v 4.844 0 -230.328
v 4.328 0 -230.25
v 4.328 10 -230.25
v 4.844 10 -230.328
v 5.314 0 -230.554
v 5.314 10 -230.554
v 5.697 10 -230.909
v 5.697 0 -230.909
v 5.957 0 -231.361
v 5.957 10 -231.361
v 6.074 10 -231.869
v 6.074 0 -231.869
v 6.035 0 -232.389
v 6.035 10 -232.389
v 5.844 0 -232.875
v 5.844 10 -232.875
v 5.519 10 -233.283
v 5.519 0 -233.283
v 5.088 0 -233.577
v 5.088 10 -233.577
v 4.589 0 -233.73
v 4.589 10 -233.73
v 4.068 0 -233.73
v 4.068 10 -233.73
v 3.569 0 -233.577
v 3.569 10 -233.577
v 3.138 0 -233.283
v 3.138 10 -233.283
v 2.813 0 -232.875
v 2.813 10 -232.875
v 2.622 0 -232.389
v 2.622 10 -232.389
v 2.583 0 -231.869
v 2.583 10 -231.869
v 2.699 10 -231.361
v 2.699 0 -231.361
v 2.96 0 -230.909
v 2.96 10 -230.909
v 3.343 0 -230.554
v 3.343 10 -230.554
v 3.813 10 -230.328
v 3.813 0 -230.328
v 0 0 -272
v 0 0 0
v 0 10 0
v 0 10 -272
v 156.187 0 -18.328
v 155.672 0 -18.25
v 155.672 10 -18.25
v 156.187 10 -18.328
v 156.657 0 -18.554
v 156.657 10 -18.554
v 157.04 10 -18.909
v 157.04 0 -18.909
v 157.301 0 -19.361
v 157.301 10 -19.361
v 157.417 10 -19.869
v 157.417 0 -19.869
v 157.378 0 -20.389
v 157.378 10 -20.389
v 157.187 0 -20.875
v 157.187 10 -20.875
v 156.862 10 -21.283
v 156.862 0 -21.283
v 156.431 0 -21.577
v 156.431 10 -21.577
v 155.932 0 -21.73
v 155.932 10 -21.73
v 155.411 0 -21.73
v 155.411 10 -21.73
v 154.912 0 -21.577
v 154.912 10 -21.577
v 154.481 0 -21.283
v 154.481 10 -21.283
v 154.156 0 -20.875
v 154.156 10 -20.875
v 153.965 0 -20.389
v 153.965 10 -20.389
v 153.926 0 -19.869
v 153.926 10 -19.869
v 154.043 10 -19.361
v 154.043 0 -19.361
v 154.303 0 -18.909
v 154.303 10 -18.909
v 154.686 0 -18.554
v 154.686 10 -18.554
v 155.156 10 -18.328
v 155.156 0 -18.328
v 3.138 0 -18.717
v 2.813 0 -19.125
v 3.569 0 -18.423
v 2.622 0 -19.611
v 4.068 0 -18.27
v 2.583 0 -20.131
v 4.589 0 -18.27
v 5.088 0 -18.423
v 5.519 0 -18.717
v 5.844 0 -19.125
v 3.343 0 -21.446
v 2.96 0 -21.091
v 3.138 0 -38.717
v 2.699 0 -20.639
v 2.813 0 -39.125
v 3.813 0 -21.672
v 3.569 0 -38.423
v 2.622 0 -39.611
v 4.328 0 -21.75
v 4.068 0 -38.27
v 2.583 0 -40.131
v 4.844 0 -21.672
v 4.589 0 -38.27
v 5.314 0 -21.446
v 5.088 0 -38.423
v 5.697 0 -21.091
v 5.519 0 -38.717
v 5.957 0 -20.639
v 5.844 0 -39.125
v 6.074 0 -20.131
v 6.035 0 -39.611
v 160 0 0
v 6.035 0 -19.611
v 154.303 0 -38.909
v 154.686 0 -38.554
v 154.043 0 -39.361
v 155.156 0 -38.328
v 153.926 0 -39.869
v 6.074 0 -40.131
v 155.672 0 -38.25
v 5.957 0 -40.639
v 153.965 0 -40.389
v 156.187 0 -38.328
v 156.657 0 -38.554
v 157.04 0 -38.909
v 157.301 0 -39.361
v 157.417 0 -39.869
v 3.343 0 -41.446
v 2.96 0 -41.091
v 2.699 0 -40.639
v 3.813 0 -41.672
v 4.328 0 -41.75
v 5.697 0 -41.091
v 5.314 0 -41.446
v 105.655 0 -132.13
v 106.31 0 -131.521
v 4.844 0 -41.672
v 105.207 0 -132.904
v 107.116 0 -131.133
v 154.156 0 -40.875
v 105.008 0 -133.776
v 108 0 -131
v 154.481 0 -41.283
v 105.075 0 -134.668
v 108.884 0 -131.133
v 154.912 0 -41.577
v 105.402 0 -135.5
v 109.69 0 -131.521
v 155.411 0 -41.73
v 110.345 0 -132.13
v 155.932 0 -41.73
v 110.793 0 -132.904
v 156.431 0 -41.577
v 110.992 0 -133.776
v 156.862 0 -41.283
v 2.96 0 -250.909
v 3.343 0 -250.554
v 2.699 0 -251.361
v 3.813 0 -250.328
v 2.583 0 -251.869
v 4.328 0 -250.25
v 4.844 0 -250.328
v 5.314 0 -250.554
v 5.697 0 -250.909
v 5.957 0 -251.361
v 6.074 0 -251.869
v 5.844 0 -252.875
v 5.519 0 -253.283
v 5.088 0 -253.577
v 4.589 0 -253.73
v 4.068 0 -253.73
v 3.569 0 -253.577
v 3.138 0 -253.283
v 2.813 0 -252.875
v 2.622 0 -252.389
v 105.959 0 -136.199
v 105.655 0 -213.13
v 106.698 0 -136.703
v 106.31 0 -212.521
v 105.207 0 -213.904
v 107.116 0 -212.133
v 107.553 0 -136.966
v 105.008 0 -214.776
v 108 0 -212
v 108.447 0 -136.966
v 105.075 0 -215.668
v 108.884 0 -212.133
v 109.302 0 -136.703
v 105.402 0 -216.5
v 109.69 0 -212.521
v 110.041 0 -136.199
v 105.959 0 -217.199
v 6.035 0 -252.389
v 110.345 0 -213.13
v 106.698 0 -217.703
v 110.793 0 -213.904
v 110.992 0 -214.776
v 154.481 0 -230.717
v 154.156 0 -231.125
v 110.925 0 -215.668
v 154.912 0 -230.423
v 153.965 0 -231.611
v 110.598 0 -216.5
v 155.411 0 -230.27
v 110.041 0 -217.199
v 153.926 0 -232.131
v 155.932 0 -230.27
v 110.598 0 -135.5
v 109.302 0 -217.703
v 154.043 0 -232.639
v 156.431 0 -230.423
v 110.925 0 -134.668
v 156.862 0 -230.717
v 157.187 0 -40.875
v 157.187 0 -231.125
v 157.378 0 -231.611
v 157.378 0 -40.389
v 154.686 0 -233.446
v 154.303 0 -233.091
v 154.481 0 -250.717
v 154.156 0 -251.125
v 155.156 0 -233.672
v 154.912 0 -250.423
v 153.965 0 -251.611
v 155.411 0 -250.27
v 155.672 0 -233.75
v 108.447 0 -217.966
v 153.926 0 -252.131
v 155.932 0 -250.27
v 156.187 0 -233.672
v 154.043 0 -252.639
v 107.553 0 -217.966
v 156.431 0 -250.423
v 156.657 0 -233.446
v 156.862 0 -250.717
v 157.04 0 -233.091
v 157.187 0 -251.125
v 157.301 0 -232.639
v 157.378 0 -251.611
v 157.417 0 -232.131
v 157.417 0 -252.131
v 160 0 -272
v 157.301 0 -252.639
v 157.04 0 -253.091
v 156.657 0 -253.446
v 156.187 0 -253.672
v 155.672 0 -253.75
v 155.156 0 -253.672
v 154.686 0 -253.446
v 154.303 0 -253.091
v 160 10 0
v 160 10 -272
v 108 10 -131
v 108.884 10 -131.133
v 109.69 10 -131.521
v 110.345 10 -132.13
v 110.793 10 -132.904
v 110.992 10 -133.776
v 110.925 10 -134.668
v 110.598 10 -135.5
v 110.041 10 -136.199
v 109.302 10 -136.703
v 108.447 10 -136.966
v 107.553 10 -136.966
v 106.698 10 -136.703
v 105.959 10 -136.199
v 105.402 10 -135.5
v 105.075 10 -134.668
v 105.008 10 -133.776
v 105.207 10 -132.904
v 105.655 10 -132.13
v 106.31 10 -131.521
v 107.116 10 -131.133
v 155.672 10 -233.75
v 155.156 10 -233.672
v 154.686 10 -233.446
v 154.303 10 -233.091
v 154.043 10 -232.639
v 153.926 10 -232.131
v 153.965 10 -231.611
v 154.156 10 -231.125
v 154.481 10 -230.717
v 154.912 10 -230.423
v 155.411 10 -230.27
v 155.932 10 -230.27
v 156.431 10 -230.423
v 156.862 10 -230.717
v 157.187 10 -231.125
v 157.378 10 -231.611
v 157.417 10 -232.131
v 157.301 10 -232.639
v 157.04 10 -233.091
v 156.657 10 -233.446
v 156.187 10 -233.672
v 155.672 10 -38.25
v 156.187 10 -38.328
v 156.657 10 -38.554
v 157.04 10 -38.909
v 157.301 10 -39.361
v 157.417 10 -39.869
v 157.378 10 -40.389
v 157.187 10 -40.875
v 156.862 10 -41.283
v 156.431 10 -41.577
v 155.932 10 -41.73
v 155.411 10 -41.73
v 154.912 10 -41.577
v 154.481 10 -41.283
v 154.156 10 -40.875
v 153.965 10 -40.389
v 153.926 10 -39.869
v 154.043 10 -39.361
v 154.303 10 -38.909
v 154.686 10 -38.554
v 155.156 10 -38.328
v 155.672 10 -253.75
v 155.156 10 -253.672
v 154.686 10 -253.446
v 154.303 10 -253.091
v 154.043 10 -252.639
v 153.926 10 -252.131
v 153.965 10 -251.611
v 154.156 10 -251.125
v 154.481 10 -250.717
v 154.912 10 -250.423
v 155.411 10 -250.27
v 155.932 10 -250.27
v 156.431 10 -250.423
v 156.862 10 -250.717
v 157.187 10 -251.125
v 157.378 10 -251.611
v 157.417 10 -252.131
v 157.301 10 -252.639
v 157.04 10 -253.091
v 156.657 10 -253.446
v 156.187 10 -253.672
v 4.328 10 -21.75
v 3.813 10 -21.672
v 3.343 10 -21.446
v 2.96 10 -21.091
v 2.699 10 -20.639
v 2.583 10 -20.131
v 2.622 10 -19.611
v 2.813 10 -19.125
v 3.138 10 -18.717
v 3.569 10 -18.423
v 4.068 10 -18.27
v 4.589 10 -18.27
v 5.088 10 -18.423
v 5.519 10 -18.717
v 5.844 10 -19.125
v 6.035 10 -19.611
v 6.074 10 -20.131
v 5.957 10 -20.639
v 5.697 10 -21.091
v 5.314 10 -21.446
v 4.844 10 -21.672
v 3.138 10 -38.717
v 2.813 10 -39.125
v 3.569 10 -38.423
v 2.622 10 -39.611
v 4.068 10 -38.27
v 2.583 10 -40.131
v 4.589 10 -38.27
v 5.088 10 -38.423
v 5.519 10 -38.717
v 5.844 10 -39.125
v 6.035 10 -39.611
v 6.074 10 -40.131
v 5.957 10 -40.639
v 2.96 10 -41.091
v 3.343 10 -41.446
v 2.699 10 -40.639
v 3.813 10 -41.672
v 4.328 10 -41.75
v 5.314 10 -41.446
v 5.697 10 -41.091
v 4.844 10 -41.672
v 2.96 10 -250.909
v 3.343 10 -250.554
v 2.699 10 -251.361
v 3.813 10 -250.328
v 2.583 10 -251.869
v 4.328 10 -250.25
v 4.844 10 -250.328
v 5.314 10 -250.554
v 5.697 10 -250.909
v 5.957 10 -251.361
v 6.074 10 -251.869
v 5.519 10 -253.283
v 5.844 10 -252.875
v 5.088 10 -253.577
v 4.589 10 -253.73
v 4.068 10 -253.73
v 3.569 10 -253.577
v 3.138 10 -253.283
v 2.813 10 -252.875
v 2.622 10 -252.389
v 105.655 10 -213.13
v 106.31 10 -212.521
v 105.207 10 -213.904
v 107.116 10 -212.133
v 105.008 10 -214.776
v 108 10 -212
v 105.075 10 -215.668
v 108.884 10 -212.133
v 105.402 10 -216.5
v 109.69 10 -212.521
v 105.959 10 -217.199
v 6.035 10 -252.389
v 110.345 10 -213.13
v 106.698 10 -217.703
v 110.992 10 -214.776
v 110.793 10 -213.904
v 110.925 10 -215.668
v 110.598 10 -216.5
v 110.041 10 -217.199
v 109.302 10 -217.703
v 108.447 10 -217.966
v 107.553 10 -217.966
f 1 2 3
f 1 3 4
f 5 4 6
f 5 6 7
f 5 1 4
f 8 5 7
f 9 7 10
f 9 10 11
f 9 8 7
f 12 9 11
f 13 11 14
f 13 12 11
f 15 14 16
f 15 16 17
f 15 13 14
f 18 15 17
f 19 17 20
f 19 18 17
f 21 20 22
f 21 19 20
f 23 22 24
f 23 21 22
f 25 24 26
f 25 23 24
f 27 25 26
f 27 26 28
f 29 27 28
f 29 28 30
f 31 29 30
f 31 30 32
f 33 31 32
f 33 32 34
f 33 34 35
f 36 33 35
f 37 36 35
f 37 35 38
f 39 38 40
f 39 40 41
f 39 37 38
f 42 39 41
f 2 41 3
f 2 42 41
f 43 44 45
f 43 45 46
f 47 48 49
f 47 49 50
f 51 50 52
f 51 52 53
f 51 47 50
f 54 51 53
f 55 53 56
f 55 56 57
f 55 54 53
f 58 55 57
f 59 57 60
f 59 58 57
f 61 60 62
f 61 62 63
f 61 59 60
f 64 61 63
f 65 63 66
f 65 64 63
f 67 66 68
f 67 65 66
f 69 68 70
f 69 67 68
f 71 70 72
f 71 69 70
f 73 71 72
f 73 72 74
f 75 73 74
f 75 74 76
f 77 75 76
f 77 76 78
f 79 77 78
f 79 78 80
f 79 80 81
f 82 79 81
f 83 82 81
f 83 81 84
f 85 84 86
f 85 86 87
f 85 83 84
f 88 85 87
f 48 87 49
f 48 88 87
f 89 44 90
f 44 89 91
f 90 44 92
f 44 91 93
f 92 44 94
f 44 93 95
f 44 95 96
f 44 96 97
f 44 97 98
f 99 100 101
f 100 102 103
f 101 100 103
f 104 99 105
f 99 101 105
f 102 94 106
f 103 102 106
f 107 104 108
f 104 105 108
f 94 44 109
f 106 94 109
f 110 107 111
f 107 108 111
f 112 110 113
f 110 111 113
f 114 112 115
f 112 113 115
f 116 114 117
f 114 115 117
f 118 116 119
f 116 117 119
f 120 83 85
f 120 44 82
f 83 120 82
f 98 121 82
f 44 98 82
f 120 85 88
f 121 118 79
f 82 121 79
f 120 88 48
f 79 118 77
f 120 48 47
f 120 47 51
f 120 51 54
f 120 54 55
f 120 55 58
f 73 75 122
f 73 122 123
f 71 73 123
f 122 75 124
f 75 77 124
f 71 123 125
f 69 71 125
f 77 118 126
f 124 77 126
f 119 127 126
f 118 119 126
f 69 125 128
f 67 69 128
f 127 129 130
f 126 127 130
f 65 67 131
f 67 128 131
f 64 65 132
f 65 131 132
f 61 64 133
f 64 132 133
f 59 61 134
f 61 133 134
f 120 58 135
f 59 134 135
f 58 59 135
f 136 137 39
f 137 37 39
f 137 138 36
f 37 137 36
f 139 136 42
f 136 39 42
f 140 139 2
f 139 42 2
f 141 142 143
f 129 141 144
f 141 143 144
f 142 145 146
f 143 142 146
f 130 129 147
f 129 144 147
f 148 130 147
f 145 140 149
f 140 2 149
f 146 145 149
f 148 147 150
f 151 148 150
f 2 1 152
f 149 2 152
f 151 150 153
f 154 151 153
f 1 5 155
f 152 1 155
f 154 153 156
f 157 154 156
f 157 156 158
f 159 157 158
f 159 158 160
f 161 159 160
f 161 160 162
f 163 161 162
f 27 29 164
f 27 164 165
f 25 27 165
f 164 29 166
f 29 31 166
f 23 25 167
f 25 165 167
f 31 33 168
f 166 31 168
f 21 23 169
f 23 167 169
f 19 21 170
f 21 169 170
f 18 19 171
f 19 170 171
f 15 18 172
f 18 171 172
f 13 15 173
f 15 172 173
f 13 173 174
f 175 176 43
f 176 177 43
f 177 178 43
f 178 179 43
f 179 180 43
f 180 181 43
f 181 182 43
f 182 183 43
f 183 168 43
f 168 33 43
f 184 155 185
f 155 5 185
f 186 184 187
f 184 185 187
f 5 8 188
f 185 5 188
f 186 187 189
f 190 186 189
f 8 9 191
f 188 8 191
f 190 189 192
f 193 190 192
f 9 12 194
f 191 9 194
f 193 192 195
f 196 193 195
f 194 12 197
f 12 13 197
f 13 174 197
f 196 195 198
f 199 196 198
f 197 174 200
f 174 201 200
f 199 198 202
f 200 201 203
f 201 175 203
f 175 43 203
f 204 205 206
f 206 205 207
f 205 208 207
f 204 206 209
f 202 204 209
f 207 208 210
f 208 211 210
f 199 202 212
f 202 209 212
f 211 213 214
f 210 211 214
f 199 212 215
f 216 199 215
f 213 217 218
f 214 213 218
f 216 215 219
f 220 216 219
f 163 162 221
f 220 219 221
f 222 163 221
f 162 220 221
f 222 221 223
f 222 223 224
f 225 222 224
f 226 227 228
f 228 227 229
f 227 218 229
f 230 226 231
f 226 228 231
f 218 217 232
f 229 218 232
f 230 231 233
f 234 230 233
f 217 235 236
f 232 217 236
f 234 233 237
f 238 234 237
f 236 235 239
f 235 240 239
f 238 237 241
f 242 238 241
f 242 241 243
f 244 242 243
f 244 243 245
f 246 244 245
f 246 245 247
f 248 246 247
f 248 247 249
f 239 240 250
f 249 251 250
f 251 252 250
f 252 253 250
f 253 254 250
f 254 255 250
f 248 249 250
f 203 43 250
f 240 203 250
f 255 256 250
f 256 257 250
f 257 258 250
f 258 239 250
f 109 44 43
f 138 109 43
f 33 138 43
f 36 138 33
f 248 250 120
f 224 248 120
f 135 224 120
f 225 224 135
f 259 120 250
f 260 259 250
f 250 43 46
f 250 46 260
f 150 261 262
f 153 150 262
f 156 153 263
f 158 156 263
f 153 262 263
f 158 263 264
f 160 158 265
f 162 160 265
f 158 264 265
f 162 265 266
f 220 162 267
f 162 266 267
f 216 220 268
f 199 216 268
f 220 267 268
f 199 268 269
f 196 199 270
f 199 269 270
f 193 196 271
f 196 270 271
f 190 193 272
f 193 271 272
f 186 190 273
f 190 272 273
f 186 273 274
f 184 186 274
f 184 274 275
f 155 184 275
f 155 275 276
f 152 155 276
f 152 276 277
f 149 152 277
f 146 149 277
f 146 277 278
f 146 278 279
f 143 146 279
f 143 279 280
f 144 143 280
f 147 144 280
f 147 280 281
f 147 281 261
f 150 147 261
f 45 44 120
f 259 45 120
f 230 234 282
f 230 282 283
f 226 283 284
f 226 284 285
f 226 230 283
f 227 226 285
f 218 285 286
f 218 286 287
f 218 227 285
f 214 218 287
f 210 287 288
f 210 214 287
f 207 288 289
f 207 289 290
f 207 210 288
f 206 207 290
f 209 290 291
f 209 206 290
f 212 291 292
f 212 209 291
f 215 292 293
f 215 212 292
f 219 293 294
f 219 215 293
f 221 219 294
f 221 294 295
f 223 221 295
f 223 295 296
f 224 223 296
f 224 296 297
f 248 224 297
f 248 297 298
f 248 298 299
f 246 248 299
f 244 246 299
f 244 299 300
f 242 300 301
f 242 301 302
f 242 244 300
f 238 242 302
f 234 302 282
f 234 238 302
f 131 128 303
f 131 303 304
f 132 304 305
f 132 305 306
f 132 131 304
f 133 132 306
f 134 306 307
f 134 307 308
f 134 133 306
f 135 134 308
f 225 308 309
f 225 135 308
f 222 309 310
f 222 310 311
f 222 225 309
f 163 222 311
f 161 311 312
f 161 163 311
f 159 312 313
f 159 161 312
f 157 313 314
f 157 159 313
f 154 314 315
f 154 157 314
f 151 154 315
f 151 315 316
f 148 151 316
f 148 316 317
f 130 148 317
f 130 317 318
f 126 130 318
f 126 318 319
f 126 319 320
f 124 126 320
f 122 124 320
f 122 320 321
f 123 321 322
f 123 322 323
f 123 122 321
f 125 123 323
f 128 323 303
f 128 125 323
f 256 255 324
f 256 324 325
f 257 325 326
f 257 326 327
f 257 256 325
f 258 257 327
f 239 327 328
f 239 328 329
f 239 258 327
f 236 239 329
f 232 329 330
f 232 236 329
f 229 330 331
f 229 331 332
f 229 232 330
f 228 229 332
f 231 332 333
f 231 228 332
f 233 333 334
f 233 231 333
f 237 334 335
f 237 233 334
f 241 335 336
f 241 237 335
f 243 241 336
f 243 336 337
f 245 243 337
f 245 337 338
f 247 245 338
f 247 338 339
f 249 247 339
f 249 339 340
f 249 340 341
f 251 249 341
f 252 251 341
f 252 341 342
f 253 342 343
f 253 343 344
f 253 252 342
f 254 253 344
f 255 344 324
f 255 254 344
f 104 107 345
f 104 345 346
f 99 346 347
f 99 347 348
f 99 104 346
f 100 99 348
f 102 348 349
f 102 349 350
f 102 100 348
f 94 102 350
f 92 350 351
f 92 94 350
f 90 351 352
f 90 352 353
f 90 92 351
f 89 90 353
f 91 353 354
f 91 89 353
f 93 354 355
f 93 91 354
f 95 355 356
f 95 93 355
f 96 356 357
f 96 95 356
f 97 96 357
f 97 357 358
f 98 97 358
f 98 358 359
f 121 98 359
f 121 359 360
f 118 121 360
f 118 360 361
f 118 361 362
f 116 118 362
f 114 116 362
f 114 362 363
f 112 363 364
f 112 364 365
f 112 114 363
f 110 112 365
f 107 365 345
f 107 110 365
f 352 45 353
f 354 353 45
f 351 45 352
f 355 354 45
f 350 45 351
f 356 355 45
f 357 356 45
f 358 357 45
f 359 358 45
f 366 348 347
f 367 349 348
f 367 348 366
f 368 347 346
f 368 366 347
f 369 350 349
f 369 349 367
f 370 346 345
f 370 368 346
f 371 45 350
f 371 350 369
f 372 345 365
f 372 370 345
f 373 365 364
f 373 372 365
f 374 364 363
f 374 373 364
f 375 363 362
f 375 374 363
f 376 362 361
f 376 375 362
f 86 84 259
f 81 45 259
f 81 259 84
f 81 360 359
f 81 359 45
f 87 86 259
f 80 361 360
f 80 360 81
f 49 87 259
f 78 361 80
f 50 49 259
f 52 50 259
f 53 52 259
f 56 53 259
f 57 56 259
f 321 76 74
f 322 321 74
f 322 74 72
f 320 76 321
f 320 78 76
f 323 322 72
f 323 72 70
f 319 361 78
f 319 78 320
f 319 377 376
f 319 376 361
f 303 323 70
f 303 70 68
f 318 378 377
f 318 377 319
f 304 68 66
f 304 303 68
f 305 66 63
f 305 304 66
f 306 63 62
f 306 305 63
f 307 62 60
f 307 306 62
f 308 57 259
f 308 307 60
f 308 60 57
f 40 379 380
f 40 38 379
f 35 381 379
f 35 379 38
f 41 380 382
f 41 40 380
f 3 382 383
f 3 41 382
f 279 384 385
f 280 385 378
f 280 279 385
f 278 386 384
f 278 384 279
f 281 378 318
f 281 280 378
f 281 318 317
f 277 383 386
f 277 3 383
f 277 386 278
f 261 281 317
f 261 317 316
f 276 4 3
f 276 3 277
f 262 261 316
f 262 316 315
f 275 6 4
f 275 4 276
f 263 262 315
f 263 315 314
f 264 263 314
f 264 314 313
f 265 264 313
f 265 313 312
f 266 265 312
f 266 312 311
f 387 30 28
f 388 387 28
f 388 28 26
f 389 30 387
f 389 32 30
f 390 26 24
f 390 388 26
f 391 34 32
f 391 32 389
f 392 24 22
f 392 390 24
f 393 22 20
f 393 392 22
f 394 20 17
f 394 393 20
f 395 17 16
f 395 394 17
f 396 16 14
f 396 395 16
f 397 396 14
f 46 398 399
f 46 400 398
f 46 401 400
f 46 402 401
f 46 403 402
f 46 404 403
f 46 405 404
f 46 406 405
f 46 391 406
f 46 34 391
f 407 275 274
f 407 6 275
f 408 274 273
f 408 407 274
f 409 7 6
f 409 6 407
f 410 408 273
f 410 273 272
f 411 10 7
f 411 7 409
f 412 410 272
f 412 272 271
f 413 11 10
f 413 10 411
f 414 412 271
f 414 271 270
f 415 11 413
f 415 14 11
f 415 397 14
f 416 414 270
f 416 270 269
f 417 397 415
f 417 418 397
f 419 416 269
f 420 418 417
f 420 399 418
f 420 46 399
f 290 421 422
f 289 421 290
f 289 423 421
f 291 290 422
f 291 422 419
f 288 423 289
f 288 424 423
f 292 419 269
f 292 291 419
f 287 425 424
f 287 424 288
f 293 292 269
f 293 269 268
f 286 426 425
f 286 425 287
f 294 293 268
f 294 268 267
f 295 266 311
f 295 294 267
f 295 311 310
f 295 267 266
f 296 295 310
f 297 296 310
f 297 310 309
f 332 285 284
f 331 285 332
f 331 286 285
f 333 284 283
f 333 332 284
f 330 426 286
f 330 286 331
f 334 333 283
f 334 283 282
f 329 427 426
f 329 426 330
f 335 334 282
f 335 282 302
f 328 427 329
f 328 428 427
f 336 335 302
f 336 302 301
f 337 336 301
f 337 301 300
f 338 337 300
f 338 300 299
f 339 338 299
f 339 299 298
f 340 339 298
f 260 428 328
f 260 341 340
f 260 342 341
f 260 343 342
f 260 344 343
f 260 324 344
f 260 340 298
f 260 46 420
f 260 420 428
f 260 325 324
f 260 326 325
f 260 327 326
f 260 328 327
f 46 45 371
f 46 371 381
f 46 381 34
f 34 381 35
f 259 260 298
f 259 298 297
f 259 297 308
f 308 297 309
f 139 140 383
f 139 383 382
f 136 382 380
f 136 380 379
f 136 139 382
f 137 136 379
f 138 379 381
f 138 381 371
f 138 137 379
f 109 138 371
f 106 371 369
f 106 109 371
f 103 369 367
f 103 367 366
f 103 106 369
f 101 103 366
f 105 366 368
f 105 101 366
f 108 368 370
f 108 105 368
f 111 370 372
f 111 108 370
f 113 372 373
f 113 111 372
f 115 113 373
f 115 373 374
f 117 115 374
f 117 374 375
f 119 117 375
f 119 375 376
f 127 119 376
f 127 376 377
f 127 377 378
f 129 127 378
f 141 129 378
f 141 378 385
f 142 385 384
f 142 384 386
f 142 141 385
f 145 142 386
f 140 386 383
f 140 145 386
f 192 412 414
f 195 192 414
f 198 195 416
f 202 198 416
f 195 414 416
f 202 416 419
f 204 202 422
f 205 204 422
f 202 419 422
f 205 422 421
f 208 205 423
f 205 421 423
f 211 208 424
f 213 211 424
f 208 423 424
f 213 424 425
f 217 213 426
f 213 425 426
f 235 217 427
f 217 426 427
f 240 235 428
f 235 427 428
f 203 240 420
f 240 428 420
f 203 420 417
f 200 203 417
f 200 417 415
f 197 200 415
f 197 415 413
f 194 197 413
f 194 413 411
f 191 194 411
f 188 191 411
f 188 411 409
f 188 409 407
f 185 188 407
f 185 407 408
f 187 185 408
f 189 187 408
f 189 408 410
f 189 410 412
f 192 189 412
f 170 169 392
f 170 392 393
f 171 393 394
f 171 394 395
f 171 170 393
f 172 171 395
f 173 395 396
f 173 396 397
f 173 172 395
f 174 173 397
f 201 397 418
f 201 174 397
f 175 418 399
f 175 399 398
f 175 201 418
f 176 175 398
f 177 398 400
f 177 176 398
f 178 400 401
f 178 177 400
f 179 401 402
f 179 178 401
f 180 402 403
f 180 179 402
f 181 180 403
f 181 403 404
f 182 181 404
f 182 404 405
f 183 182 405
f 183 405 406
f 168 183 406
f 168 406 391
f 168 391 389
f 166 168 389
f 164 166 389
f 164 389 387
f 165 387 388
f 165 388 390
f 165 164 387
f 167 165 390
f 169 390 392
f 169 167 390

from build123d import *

# Parameters (mm, degrees)
SKETCH1_W           = 160
SKETCH1_H           = 272
SKETCH1_R           = 1.75
BOSS_EXTRUDE1_DEPTH = 10
SKETCH3_R           = 3
CUT_EXTRUDE1_DEPTH  = 18


with BuildPart() as part:
    # Sketch1 → Boss-Extrude1 (new body)
    with BuildSketch(Plane(origin=(0, 0, 0), x_dir=(1, 0, 0), z_dir=(0, 1, 0))):
        with Locations((80, 136)):
            Rectangle(SKETCH1_W, SKETCH1_H)
        with Locations(Location((4.328403696, 232, 0), (0, 0, 270))):
            Circle(SKETCH1_R, mode=Mode.SUBTRACT)
        with Locations(Location((4.328403696, 252, 0), (0, 0, 270))):
            Circle(SKETCH1_R, mode=Mode.SUBTRACT)
        with Locations(Location((4.328403696, 40, 0), (0, 0, 90))):
            Circle(SKETCH1_R, mode=Mode.SUBTRACT)
        with Locations(Location((4.328403696, 20, 0), (0, 0, 90))):
            Circle(SKETCH1_R, mode=Mode.SUBTRACT)
        with Locations(Location((155.671596304, 20, 0), (0, 0, 270))):
            Circle(SKETCH1_R, mode=Mode.SUBTRACT)
        with Locations(Location((155.671596304, 40, 0), (0, 0, 270))):
            Circle(SKETCH1_R, mode=Mode.SUBTRACT)
        with Locations(Location((155.671596304, 232, 0), (0, 0, 90))):
            Circle(SKETCH1_R, mode=Mode.SUBTRACT)
        with Locations(Location((155.671596304, 252, 0), (0, 0, 90))):
            Circle(SKETCH1_R, mode=Mode.SUBTRACT)
    extrude(amount=BOSS_EXTRUDE1_DEPTH)

    # Sketch3 → Cut-Extrude1 (cut)
    with BuildSketch(Plane(origin=(0, 10, 0), x_dir=(1, 0, 0), z_dir=(0, 1, 0))):
        with Locations(Location((108, 134, 0), (0, 0, 270))):
            Circle(SKETCH3_R)
        with Locations(Location((108, 215, 0), (0, 0, 270))):
            Circle(SKETCH3_R)
    extrude(amount=-CUT_EXTRUDE1_DEPTH, mode=Mode.SUBTRACT)


solid = part.part
